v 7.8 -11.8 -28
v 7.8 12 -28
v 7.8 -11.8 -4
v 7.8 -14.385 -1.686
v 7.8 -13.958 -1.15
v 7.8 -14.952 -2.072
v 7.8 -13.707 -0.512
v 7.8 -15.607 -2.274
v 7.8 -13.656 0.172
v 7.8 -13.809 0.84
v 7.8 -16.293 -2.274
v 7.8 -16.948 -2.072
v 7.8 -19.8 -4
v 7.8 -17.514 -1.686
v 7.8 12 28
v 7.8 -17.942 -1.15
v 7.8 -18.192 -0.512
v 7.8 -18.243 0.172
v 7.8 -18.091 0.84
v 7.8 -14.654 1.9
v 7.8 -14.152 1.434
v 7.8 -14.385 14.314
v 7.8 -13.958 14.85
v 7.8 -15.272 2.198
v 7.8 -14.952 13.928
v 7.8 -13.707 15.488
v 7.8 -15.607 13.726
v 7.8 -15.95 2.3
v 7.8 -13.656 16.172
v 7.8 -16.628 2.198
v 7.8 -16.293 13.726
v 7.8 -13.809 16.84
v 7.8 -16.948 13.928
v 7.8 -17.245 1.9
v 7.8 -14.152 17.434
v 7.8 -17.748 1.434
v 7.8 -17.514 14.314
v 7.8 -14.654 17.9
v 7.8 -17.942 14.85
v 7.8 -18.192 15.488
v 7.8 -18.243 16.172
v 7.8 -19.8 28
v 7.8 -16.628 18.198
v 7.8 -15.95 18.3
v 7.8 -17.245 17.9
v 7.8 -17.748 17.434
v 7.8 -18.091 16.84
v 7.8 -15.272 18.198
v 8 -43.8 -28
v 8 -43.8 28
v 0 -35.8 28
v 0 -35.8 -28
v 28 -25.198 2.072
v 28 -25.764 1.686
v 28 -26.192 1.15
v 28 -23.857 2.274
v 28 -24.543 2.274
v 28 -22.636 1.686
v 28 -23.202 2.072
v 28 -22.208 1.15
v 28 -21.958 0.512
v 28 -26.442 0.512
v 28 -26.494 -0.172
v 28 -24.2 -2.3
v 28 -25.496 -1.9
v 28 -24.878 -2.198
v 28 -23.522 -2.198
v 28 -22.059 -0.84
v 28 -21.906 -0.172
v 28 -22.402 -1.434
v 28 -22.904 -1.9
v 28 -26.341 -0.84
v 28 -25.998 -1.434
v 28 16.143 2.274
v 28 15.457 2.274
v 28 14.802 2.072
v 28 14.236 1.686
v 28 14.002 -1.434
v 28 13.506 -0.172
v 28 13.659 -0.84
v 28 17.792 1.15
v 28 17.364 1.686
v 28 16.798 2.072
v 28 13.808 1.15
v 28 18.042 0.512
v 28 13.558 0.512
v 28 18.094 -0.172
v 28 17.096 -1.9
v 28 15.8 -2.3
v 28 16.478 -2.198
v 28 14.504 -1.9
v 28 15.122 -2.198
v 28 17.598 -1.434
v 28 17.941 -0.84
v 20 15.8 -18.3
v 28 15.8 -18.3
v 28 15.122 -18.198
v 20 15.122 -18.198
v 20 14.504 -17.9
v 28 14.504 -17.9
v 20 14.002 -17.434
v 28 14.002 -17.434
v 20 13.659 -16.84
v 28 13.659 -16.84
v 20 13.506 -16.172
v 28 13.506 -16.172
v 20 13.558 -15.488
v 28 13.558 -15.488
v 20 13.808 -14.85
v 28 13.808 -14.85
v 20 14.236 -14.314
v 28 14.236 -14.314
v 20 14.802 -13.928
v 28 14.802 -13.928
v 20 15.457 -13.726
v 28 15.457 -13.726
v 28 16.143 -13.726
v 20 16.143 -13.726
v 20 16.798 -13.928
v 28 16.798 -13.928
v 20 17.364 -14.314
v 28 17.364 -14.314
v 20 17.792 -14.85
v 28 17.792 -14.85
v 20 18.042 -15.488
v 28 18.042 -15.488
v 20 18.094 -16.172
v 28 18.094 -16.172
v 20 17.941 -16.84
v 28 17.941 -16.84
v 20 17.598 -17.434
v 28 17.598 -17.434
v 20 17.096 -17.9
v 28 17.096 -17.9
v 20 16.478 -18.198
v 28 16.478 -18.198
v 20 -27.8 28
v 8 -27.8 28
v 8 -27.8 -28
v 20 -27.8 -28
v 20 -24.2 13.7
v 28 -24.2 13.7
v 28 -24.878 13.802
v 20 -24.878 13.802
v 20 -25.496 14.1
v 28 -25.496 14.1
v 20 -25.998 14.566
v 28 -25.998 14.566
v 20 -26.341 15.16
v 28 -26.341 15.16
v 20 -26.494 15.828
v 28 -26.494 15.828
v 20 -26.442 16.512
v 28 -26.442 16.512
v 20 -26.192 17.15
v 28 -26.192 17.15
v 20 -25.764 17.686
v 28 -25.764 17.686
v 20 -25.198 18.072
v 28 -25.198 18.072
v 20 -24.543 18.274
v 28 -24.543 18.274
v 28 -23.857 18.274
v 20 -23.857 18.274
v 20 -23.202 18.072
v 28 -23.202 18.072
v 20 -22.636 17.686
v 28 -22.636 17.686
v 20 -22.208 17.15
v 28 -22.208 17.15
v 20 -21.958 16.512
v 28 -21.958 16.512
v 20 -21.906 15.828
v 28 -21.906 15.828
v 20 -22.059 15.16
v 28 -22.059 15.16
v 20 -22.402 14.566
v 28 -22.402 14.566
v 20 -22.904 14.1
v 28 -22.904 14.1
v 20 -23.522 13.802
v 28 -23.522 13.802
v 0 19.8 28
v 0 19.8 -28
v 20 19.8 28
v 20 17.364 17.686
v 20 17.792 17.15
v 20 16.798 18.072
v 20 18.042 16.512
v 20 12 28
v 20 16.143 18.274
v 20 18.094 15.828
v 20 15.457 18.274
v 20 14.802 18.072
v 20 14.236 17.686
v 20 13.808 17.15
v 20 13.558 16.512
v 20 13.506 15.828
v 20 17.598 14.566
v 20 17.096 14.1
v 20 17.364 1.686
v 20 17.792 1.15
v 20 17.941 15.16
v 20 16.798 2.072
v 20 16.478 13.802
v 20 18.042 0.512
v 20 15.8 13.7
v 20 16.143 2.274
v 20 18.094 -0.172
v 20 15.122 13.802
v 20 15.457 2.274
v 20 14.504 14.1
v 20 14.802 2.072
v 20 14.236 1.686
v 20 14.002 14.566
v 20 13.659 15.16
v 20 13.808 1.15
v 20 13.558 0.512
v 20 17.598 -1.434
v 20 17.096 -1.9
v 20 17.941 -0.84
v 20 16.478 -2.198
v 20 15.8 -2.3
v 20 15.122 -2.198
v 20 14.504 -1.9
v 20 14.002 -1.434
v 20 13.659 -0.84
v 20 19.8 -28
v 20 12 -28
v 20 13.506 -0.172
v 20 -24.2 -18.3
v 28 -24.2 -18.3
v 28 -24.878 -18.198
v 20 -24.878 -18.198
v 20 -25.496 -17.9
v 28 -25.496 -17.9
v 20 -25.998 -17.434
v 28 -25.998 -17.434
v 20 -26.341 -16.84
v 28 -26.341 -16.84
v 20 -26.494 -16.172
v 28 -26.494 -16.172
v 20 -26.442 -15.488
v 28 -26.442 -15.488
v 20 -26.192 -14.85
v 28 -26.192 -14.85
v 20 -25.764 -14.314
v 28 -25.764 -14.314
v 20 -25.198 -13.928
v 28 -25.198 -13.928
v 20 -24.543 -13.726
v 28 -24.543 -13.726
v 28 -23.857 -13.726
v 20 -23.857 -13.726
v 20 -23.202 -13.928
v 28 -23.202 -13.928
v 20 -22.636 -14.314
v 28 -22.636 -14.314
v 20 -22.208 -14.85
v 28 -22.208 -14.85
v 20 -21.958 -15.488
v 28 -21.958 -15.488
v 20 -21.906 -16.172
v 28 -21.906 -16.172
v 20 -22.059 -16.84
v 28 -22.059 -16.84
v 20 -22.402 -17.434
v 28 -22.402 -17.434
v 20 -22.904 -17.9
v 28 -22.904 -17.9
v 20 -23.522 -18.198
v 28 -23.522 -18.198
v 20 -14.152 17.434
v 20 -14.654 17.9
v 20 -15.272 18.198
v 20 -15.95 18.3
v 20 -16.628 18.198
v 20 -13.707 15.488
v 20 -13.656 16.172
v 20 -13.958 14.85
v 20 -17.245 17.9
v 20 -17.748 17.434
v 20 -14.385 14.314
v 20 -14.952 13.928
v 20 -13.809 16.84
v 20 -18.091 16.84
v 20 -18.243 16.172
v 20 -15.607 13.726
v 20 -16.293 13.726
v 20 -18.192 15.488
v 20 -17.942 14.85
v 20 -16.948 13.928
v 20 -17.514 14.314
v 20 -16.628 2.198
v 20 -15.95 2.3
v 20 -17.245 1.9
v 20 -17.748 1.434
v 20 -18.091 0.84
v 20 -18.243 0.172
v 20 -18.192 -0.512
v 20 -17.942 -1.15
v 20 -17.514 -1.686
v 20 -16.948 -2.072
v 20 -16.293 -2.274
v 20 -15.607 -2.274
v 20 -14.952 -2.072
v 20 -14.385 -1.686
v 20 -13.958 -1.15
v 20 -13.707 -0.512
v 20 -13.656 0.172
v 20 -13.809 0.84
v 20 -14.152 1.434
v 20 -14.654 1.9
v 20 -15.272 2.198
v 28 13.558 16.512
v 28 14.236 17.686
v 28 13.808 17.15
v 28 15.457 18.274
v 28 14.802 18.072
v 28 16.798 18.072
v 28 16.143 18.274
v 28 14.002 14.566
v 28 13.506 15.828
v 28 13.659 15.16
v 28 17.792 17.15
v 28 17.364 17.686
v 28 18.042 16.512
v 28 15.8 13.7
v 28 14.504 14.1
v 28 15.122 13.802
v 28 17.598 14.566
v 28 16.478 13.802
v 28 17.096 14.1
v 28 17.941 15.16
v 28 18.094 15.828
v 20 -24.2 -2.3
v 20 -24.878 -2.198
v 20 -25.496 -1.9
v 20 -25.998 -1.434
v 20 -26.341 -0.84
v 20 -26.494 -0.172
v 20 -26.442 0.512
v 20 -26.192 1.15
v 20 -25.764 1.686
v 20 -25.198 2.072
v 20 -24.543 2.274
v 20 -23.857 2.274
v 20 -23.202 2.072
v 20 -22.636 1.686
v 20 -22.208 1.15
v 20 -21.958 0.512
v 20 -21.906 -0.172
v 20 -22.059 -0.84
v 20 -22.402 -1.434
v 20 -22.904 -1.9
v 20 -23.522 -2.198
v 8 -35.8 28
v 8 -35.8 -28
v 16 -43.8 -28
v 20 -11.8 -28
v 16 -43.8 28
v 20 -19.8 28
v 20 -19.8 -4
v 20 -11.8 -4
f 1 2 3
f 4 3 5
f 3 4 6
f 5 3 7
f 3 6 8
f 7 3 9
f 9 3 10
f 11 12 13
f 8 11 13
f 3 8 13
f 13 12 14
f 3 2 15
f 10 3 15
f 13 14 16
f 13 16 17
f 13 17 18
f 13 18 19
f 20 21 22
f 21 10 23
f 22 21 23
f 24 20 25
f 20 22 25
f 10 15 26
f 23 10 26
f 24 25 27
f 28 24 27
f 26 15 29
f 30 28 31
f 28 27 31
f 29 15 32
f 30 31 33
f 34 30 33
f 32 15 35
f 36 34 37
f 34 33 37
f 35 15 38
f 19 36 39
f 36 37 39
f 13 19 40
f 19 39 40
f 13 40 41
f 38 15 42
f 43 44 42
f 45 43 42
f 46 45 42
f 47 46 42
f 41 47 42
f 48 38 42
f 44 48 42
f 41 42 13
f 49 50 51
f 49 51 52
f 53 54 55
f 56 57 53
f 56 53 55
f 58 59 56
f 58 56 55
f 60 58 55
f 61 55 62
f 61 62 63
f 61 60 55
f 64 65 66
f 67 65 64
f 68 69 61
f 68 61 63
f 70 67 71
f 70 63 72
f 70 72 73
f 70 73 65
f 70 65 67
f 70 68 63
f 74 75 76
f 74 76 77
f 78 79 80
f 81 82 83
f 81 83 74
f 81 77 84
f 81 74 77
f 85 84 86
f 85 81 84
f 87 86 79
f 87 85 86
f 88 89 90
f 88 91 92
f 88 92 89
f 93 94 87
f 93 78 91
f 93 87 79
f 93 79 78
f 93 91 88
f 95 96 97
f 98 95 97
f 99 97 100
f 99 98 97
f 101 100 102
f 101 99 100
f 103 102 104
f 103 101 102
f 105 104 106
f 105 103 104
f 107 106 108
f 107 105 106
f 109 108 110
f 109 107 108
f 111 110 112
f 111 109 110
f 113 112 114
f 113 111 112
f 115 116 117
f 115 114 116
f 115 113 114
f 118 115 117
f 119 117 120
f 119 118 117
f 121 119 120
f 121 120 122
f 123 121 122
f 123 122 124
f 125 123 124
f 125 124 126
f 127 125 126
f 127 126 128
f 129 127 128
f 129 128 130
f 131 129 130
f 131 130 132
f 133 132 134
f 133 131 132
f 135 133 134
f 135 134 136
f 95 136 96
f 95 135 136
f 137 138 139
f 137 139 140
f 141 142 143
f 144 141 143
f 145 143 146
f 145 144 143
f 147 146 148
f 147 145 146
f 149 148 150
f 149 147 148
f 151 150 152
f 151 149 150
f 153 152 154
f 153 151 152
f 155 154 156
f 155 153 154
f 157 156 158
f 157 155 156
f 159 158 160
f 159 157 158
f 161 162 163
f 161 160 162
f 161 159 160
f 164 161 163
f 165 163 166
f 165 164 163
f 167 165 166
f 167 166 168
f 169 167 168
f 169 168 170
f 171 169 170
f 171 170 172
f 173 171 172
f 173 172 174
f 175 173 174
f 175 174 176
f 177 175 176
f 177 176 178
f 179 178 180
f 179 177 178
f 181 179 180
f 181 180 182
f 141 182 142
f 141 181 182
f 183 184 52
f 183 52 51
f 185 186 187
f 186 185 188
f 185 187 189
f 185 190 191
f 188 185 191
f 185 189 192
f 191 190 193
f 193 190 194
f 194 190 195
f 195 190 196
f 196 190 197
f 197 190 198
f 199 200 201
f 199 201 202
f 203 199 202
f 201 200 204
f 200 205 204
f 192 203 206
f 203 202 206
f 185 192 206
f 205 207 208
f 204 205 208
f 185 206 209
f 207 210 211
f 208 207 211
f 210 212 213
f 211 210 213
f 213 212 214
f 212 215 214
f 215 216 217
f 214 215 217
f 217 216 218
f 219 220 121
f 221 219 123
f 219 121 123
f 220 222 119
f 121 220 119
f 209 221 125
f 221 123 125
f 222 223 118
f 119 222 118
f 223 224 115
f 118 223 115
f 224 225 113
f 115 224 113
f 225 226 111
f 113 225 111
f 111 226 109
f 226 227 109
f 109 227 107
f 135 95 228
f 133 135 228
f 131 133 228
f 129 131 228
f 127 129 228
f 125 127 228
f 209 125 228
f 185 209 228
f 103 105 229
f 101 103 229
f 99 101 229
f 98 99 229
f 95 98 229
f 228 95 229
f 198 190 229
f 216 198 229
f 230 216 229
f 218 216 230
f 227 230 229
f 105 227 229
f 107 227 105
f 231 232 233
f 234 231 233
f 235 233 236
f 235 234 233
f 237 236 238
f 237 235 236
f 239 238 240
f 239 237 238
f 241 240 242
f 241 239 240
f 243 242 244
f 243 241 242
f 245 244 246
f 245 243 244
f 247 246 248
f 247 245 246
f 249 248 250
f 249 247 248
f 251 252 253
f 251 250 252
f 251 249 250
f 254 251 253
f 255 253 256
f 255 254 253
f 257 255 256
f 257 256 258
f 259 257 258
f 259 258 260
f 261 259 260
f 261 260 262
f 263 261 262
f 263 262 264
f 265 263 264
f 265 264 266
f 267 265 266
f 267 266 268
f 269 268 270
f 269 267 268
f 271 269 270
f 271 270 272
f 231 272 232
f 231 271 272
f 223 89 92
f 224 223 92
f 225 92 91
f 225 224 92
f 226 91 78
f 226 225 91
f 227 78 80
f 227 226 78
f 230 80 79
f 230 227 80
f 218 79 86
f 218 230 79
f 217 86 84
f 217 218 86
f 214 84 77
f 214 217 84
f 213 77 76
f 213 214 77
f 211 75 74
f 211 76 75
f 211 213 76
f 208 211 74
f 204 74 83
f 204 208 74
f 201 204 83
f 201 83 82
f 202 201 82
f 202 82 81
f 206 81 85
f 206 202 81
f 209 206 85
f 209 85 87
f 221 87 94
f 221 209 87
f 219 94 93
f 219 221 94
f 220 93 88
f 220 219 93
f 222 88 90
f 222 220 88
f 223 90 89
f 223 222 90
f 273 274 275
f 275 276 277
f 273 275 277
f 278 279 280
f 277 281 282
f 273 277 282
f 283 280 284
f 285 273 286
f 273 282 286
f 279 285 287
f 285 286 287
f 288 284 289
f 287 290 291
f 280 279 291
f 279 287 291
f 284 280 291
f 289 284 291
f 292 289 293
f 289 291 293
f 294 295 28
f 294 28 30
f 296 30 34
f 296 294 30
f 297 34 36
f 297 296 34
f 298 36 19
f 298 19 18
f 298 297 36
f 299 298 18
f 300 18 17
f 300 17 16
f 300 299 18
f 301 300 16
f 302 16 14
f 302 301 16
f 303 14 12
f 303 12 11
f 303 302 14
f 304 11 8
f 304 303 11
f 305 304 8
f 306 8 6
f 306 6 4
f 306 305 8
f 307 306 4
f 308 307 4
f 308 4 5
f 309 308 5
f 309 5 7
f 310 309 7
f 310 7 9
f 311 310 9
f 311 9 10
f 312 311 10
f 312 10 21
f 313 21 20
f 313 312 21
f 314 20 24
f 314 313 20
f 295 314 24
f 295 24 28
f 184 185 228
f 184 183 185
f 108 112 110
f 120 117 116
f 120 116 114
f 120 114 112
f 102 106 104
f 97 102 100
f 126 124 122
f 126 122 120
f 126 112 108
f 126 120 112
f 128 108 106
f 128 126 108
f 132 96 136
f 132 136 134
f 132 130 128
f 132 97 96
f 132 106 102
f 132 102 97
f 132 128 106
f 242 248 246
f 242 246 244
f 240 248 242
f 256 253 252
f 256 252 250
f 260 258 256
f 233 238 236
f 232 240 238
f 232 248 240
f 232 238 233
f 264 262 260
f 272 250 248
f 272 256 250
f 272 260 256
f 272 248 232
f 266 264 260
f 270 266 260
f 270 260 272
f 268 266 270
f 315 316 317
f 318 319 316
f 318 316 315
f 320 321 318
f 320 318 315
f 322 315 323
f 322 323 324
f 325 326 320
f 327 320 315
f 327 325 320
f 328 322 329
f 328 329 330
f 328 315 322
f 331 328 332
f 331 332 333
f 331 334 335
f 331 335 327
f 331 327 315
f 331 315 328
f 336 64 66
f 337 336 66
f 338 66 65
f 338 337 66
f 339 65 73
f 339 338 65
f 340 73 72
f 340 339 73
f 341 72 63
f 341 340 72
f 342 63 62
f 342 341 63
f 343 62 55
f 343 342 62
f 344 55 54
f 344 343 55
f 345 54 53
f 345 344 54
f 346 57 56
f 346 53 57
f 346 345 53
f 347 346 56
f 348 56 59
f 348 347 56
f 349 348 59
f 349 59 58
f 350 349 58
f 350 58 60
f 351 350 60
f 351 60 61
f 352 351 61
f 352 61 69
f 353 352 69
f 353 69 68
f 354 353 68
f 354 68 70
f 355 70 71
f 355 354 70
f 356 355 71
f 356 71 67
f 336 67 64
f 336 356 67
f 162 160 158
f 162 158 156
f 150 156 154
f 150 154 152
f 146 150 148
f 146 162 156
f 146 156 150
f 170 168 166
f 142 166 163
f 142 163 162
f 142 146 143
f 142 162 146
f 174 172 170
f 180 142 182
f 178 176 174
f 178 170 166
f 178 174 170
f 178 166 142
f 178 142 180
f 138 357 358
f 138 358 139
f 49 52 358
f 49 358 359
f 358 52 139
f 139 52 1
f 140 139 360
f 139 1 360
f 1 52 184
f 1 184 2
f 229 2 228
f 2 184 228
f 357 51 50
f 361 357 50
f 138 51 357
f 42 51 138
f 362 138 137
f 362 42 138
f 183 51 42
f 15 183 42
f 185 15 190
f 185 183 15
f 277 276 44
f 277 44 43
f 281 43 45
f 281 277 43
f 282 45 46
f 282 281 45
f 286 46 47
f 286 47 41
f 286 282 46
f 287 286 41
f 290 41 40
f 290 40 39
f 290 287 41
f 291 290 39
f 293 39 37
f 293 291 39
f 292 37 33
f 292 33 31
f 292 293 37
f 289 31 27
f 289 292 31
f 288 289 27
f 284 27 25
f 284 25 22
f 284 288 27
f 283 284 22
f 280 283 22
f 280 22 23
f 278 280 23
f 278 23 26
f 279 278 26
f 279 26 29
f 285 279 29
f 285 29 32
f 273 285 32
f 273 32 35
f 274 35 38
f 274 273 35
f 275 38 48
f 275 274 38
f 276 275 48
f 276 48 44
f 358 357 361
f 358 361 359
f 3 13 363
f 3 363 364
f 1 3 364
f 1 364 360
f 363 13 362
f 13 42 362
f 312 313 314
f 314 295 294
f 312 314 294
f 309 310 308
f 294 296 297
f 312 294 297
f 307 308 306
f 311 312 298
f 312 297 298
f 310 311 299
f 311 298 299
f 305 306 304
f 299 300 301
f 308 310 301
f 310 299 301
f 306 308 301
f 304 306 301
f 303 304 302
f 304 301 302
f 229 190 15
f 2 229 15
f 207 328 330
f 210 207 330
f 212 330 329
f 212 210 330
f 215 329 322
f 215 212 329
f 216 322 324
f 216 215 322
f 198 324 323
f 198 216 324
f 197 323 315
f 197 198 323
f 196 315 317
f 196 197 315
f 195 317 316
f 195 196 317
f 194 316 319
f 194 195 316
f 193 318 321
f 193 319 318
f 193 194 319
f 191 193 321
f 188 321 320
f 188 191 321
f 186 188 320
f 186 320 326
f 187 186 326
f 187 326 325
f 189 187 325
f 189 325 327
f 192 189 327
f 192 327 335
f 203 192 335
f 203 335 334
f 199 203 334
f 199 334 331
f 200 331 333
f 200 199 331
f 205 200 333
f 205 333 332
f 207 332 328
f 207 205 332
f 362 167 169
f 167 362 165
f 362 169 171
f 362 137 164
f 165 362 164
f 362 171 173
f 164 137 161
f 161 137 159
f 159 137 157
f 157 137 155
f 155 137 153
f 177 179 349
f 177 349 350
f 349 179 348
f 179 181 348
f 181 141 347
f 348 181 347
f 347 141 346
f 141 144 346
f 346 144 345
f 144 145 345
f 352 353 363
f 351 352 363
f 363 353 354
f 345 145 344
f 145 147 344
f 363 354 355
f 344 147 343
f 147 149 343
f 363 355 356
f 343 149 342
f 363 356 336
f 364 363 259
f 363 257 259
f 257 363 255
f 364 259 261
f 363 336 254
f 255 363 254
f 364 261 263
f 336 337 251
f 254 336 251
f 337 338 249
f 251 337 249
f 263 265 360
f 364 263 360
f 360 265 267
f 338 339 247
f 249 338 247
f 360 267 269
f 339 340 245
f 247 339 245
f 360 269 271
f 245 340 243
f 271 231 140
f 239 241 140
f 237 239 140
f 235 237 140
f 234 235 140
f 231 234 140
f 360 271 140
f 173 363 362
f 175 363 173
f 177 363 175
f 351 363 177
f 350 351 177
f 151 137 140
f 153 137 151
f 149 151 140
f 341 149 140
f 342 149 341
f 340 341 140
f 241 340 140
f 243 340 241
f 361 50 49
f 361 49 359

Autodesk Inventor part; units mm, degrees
ref_plane "YZ Plane" through (0, 0, 0) normal (1, 0, 0) x (0, 1, 0)
ref_plane "XZ Plane" through (0, 0, 0) normal (0, 1, 0) x (-1, 0, 0)
ref_plane "XY Plane" through (0, 0, 0) normal (0, 0, 1) x (1, 0, 0)
sketch "Sketch1" plane through (0, 0, 0) normal (1, 0, 0) x (0, 1, 0)
  line L0 (-19.8, 28) -> (19.8, 28)
  line L1 (19.8, 28) -> (19.8, -28)
  line L2 (19.8, -28) -> (-19.8, -28)
  line L3 (-19.8, -28) -> (-19.8, 28)
  line L4 (-19.8, 28) -> (19.8, -28) construction
  line L5 (19.8, 28) -> (-19.8, -28) construction
  point P0 (0, 0)
  dimension "d0" = 39.6
  dimension "d1" = 56
extrude "Extrusion1" add sketch "Sketch1" along normal blind 40
sketch "Sketch2" plane through (0, -19.8, 28) normal (0, 0, 1) x (1, 0, 0)
  line L0 (7.8, 0) -> (32.2, 0)
  line L1 (32.2, 0) -> (32.2, 31.8)
  line L2 (32.2, 31.8) -> (7.8, 31.8)
  line L3 (7.8, 31.8) -> (7.8, 0)
  line L4 (0, 0) -> (40, 0) projected
  line L5 (40, 39.6) -> (40, 0) projected
  dimension "d4" = 24.4
  dimension "d5" = 31.8
  dimension "d6" = 7.8
extrude "Extrusion2" cut sketch "Sketch2" against normal blind 64
sketch "Sketch3" plane through (32.2, -19.8, 28) normal (-1, 0, 0) x (0, 0, 1)
  circle A0 centre (-12, 3.8502) radius 2.3
  circle A1 centre (-28, 3.8502) radius 2.3
  line L0 (0, 31.8) -> (0, 0) projected
  point P0 (-28, 19.8)
  dimension "d9" = 4.6
  dimension "d10" = 4.6
  dimension "d11" = 16
  dimension "d12" = 12
extrude "Extrusion3" add sketch "Sketch3" along normal blind 26
sketch "Sketch4" plane through (7.8, -19.8, 28) normal (1, 0, 0) x (0, 0, -1)
  line L0 (56, 0) -> (0, 0) projected
  line L1 (56, 0) -> (32, 0)
  line L2 (32, 0) -> (32, 8)
  line L3 (32, 8) -> (56, 8)
  line L4 (56, 8) -> (56, 0)
  point P0 (28, 19.8)
  point P1 (32, 0)
  dimension "d15" = 24
  dimension "d16" = 8
extrude "Extrusion4" add sketch "Sketch4" along normal blind 26
sketch "Sketch14" plane through (0, 19.8, 28) normal (0, 1, 0) x (1, 0, 0)
  line L0 (20, 0) -> (20, 56) projected
  point P0 (0, 28)
sketch "Sketch15" plane through (0, -19.8, -28) normal (0, -1, 0) x (1, 0, 0)
  line L0 (40, 0) -> (40, 56) projected
  line L1 (0, 0) -> (40, 0) projected
  line L2 (0, 56) -> (40, 56) projected
  line L3 (0, 0) -> (0, 56) projected
  point P0 (0, 28)
extrude "Extrusion7" add sketch "Sketch15" along normal blind 24
sketch "Sketch16" plane through (0, 19.8, 28) normal (0, 0, 1) x (1, 0, 0)
  line L0 (8, -47.6) -> (32, -47.6)
  line L1 (32, -47.6) -> (32, -55.6)
  line L2 (32, -55.6) -> (8, -55.6)
  line L3 (8, -55.6) -> (8, -47.6)
  line L4 (40, -63.6) -> (0, -63.6) projected
  line L5 (0, 0) -> (0, -63.6) projected
  line L6 (16, -55.6) -> (24, -55.6)
  line L7 (24, -55.6) -> (24, -63.6)
  line L8 (24, -63.6) -> (16, -63.6)
  line L9 (16, -63.6) -> (16, -55.6)
  point P0 (0, -19.8)
  dimension "d37" = 24
  dimension "d38" = 8
  dimension "d39" = 8
  dimension "d40" = 8
  dimension "d41" = 8
  dimension "d42" = 8
  dimension "d43" = 16
extrude "Extrusion8" cut sketch "Sketch16" against normal through all
chamfer "Chamfer1" distance 8 angle 45 2 edges at (40, -43.8, 0) (0, -43.8, 0)
chamfer "Chamfer2" distance 8 angle 45 2 edges at (16, -35.8, 0) (24, -35.8, 0)
split body "Split1" sketch "Sketch14" result one side removed curves L0 removed pieces at (39.5, -17.2667, 9.3333)
sketch "Sketch17" plane through (20, -27.8, -28) normal (1, 0, 0) x (0, 0, -1)
  circle A0 centre (-44, 43.6) radius 2.3
  circle A1 centre (-28, 43.6) radius 2.3
  circle A2 centre (-12, 43.6) radius 2.3
  circle A3 centre (-44, 3.6) radius 2.3
  circle A4 centre (-28, 3.6) radius 2.3
  circle A5 centre (-12, 3.6) radius 2.3
  line L0 (-56, 39.8) -> (-56, 47.6) projected
  line L1 (-56, 47.6) -> (0, 47.6) projected
  point P0 (-28, 27.8)
  dimension "d52" = 4.6
  dimension "d53" = 4.6
  dimension "d54" = 4.6
  dimension "d55" = 4.6
  dimension "d56" = 4.6
  dimension "d57" = 4.6
  dimension "d58" = 12
  dimension "d59" = 16
  dimension "d60" = 16
  dimension "d61" = 4
  dimension "d62" = 40
extrude "Extrusion9" add sketch "Sketch17" along normal blind 8
properties part number "MotorHolder_X_L"
